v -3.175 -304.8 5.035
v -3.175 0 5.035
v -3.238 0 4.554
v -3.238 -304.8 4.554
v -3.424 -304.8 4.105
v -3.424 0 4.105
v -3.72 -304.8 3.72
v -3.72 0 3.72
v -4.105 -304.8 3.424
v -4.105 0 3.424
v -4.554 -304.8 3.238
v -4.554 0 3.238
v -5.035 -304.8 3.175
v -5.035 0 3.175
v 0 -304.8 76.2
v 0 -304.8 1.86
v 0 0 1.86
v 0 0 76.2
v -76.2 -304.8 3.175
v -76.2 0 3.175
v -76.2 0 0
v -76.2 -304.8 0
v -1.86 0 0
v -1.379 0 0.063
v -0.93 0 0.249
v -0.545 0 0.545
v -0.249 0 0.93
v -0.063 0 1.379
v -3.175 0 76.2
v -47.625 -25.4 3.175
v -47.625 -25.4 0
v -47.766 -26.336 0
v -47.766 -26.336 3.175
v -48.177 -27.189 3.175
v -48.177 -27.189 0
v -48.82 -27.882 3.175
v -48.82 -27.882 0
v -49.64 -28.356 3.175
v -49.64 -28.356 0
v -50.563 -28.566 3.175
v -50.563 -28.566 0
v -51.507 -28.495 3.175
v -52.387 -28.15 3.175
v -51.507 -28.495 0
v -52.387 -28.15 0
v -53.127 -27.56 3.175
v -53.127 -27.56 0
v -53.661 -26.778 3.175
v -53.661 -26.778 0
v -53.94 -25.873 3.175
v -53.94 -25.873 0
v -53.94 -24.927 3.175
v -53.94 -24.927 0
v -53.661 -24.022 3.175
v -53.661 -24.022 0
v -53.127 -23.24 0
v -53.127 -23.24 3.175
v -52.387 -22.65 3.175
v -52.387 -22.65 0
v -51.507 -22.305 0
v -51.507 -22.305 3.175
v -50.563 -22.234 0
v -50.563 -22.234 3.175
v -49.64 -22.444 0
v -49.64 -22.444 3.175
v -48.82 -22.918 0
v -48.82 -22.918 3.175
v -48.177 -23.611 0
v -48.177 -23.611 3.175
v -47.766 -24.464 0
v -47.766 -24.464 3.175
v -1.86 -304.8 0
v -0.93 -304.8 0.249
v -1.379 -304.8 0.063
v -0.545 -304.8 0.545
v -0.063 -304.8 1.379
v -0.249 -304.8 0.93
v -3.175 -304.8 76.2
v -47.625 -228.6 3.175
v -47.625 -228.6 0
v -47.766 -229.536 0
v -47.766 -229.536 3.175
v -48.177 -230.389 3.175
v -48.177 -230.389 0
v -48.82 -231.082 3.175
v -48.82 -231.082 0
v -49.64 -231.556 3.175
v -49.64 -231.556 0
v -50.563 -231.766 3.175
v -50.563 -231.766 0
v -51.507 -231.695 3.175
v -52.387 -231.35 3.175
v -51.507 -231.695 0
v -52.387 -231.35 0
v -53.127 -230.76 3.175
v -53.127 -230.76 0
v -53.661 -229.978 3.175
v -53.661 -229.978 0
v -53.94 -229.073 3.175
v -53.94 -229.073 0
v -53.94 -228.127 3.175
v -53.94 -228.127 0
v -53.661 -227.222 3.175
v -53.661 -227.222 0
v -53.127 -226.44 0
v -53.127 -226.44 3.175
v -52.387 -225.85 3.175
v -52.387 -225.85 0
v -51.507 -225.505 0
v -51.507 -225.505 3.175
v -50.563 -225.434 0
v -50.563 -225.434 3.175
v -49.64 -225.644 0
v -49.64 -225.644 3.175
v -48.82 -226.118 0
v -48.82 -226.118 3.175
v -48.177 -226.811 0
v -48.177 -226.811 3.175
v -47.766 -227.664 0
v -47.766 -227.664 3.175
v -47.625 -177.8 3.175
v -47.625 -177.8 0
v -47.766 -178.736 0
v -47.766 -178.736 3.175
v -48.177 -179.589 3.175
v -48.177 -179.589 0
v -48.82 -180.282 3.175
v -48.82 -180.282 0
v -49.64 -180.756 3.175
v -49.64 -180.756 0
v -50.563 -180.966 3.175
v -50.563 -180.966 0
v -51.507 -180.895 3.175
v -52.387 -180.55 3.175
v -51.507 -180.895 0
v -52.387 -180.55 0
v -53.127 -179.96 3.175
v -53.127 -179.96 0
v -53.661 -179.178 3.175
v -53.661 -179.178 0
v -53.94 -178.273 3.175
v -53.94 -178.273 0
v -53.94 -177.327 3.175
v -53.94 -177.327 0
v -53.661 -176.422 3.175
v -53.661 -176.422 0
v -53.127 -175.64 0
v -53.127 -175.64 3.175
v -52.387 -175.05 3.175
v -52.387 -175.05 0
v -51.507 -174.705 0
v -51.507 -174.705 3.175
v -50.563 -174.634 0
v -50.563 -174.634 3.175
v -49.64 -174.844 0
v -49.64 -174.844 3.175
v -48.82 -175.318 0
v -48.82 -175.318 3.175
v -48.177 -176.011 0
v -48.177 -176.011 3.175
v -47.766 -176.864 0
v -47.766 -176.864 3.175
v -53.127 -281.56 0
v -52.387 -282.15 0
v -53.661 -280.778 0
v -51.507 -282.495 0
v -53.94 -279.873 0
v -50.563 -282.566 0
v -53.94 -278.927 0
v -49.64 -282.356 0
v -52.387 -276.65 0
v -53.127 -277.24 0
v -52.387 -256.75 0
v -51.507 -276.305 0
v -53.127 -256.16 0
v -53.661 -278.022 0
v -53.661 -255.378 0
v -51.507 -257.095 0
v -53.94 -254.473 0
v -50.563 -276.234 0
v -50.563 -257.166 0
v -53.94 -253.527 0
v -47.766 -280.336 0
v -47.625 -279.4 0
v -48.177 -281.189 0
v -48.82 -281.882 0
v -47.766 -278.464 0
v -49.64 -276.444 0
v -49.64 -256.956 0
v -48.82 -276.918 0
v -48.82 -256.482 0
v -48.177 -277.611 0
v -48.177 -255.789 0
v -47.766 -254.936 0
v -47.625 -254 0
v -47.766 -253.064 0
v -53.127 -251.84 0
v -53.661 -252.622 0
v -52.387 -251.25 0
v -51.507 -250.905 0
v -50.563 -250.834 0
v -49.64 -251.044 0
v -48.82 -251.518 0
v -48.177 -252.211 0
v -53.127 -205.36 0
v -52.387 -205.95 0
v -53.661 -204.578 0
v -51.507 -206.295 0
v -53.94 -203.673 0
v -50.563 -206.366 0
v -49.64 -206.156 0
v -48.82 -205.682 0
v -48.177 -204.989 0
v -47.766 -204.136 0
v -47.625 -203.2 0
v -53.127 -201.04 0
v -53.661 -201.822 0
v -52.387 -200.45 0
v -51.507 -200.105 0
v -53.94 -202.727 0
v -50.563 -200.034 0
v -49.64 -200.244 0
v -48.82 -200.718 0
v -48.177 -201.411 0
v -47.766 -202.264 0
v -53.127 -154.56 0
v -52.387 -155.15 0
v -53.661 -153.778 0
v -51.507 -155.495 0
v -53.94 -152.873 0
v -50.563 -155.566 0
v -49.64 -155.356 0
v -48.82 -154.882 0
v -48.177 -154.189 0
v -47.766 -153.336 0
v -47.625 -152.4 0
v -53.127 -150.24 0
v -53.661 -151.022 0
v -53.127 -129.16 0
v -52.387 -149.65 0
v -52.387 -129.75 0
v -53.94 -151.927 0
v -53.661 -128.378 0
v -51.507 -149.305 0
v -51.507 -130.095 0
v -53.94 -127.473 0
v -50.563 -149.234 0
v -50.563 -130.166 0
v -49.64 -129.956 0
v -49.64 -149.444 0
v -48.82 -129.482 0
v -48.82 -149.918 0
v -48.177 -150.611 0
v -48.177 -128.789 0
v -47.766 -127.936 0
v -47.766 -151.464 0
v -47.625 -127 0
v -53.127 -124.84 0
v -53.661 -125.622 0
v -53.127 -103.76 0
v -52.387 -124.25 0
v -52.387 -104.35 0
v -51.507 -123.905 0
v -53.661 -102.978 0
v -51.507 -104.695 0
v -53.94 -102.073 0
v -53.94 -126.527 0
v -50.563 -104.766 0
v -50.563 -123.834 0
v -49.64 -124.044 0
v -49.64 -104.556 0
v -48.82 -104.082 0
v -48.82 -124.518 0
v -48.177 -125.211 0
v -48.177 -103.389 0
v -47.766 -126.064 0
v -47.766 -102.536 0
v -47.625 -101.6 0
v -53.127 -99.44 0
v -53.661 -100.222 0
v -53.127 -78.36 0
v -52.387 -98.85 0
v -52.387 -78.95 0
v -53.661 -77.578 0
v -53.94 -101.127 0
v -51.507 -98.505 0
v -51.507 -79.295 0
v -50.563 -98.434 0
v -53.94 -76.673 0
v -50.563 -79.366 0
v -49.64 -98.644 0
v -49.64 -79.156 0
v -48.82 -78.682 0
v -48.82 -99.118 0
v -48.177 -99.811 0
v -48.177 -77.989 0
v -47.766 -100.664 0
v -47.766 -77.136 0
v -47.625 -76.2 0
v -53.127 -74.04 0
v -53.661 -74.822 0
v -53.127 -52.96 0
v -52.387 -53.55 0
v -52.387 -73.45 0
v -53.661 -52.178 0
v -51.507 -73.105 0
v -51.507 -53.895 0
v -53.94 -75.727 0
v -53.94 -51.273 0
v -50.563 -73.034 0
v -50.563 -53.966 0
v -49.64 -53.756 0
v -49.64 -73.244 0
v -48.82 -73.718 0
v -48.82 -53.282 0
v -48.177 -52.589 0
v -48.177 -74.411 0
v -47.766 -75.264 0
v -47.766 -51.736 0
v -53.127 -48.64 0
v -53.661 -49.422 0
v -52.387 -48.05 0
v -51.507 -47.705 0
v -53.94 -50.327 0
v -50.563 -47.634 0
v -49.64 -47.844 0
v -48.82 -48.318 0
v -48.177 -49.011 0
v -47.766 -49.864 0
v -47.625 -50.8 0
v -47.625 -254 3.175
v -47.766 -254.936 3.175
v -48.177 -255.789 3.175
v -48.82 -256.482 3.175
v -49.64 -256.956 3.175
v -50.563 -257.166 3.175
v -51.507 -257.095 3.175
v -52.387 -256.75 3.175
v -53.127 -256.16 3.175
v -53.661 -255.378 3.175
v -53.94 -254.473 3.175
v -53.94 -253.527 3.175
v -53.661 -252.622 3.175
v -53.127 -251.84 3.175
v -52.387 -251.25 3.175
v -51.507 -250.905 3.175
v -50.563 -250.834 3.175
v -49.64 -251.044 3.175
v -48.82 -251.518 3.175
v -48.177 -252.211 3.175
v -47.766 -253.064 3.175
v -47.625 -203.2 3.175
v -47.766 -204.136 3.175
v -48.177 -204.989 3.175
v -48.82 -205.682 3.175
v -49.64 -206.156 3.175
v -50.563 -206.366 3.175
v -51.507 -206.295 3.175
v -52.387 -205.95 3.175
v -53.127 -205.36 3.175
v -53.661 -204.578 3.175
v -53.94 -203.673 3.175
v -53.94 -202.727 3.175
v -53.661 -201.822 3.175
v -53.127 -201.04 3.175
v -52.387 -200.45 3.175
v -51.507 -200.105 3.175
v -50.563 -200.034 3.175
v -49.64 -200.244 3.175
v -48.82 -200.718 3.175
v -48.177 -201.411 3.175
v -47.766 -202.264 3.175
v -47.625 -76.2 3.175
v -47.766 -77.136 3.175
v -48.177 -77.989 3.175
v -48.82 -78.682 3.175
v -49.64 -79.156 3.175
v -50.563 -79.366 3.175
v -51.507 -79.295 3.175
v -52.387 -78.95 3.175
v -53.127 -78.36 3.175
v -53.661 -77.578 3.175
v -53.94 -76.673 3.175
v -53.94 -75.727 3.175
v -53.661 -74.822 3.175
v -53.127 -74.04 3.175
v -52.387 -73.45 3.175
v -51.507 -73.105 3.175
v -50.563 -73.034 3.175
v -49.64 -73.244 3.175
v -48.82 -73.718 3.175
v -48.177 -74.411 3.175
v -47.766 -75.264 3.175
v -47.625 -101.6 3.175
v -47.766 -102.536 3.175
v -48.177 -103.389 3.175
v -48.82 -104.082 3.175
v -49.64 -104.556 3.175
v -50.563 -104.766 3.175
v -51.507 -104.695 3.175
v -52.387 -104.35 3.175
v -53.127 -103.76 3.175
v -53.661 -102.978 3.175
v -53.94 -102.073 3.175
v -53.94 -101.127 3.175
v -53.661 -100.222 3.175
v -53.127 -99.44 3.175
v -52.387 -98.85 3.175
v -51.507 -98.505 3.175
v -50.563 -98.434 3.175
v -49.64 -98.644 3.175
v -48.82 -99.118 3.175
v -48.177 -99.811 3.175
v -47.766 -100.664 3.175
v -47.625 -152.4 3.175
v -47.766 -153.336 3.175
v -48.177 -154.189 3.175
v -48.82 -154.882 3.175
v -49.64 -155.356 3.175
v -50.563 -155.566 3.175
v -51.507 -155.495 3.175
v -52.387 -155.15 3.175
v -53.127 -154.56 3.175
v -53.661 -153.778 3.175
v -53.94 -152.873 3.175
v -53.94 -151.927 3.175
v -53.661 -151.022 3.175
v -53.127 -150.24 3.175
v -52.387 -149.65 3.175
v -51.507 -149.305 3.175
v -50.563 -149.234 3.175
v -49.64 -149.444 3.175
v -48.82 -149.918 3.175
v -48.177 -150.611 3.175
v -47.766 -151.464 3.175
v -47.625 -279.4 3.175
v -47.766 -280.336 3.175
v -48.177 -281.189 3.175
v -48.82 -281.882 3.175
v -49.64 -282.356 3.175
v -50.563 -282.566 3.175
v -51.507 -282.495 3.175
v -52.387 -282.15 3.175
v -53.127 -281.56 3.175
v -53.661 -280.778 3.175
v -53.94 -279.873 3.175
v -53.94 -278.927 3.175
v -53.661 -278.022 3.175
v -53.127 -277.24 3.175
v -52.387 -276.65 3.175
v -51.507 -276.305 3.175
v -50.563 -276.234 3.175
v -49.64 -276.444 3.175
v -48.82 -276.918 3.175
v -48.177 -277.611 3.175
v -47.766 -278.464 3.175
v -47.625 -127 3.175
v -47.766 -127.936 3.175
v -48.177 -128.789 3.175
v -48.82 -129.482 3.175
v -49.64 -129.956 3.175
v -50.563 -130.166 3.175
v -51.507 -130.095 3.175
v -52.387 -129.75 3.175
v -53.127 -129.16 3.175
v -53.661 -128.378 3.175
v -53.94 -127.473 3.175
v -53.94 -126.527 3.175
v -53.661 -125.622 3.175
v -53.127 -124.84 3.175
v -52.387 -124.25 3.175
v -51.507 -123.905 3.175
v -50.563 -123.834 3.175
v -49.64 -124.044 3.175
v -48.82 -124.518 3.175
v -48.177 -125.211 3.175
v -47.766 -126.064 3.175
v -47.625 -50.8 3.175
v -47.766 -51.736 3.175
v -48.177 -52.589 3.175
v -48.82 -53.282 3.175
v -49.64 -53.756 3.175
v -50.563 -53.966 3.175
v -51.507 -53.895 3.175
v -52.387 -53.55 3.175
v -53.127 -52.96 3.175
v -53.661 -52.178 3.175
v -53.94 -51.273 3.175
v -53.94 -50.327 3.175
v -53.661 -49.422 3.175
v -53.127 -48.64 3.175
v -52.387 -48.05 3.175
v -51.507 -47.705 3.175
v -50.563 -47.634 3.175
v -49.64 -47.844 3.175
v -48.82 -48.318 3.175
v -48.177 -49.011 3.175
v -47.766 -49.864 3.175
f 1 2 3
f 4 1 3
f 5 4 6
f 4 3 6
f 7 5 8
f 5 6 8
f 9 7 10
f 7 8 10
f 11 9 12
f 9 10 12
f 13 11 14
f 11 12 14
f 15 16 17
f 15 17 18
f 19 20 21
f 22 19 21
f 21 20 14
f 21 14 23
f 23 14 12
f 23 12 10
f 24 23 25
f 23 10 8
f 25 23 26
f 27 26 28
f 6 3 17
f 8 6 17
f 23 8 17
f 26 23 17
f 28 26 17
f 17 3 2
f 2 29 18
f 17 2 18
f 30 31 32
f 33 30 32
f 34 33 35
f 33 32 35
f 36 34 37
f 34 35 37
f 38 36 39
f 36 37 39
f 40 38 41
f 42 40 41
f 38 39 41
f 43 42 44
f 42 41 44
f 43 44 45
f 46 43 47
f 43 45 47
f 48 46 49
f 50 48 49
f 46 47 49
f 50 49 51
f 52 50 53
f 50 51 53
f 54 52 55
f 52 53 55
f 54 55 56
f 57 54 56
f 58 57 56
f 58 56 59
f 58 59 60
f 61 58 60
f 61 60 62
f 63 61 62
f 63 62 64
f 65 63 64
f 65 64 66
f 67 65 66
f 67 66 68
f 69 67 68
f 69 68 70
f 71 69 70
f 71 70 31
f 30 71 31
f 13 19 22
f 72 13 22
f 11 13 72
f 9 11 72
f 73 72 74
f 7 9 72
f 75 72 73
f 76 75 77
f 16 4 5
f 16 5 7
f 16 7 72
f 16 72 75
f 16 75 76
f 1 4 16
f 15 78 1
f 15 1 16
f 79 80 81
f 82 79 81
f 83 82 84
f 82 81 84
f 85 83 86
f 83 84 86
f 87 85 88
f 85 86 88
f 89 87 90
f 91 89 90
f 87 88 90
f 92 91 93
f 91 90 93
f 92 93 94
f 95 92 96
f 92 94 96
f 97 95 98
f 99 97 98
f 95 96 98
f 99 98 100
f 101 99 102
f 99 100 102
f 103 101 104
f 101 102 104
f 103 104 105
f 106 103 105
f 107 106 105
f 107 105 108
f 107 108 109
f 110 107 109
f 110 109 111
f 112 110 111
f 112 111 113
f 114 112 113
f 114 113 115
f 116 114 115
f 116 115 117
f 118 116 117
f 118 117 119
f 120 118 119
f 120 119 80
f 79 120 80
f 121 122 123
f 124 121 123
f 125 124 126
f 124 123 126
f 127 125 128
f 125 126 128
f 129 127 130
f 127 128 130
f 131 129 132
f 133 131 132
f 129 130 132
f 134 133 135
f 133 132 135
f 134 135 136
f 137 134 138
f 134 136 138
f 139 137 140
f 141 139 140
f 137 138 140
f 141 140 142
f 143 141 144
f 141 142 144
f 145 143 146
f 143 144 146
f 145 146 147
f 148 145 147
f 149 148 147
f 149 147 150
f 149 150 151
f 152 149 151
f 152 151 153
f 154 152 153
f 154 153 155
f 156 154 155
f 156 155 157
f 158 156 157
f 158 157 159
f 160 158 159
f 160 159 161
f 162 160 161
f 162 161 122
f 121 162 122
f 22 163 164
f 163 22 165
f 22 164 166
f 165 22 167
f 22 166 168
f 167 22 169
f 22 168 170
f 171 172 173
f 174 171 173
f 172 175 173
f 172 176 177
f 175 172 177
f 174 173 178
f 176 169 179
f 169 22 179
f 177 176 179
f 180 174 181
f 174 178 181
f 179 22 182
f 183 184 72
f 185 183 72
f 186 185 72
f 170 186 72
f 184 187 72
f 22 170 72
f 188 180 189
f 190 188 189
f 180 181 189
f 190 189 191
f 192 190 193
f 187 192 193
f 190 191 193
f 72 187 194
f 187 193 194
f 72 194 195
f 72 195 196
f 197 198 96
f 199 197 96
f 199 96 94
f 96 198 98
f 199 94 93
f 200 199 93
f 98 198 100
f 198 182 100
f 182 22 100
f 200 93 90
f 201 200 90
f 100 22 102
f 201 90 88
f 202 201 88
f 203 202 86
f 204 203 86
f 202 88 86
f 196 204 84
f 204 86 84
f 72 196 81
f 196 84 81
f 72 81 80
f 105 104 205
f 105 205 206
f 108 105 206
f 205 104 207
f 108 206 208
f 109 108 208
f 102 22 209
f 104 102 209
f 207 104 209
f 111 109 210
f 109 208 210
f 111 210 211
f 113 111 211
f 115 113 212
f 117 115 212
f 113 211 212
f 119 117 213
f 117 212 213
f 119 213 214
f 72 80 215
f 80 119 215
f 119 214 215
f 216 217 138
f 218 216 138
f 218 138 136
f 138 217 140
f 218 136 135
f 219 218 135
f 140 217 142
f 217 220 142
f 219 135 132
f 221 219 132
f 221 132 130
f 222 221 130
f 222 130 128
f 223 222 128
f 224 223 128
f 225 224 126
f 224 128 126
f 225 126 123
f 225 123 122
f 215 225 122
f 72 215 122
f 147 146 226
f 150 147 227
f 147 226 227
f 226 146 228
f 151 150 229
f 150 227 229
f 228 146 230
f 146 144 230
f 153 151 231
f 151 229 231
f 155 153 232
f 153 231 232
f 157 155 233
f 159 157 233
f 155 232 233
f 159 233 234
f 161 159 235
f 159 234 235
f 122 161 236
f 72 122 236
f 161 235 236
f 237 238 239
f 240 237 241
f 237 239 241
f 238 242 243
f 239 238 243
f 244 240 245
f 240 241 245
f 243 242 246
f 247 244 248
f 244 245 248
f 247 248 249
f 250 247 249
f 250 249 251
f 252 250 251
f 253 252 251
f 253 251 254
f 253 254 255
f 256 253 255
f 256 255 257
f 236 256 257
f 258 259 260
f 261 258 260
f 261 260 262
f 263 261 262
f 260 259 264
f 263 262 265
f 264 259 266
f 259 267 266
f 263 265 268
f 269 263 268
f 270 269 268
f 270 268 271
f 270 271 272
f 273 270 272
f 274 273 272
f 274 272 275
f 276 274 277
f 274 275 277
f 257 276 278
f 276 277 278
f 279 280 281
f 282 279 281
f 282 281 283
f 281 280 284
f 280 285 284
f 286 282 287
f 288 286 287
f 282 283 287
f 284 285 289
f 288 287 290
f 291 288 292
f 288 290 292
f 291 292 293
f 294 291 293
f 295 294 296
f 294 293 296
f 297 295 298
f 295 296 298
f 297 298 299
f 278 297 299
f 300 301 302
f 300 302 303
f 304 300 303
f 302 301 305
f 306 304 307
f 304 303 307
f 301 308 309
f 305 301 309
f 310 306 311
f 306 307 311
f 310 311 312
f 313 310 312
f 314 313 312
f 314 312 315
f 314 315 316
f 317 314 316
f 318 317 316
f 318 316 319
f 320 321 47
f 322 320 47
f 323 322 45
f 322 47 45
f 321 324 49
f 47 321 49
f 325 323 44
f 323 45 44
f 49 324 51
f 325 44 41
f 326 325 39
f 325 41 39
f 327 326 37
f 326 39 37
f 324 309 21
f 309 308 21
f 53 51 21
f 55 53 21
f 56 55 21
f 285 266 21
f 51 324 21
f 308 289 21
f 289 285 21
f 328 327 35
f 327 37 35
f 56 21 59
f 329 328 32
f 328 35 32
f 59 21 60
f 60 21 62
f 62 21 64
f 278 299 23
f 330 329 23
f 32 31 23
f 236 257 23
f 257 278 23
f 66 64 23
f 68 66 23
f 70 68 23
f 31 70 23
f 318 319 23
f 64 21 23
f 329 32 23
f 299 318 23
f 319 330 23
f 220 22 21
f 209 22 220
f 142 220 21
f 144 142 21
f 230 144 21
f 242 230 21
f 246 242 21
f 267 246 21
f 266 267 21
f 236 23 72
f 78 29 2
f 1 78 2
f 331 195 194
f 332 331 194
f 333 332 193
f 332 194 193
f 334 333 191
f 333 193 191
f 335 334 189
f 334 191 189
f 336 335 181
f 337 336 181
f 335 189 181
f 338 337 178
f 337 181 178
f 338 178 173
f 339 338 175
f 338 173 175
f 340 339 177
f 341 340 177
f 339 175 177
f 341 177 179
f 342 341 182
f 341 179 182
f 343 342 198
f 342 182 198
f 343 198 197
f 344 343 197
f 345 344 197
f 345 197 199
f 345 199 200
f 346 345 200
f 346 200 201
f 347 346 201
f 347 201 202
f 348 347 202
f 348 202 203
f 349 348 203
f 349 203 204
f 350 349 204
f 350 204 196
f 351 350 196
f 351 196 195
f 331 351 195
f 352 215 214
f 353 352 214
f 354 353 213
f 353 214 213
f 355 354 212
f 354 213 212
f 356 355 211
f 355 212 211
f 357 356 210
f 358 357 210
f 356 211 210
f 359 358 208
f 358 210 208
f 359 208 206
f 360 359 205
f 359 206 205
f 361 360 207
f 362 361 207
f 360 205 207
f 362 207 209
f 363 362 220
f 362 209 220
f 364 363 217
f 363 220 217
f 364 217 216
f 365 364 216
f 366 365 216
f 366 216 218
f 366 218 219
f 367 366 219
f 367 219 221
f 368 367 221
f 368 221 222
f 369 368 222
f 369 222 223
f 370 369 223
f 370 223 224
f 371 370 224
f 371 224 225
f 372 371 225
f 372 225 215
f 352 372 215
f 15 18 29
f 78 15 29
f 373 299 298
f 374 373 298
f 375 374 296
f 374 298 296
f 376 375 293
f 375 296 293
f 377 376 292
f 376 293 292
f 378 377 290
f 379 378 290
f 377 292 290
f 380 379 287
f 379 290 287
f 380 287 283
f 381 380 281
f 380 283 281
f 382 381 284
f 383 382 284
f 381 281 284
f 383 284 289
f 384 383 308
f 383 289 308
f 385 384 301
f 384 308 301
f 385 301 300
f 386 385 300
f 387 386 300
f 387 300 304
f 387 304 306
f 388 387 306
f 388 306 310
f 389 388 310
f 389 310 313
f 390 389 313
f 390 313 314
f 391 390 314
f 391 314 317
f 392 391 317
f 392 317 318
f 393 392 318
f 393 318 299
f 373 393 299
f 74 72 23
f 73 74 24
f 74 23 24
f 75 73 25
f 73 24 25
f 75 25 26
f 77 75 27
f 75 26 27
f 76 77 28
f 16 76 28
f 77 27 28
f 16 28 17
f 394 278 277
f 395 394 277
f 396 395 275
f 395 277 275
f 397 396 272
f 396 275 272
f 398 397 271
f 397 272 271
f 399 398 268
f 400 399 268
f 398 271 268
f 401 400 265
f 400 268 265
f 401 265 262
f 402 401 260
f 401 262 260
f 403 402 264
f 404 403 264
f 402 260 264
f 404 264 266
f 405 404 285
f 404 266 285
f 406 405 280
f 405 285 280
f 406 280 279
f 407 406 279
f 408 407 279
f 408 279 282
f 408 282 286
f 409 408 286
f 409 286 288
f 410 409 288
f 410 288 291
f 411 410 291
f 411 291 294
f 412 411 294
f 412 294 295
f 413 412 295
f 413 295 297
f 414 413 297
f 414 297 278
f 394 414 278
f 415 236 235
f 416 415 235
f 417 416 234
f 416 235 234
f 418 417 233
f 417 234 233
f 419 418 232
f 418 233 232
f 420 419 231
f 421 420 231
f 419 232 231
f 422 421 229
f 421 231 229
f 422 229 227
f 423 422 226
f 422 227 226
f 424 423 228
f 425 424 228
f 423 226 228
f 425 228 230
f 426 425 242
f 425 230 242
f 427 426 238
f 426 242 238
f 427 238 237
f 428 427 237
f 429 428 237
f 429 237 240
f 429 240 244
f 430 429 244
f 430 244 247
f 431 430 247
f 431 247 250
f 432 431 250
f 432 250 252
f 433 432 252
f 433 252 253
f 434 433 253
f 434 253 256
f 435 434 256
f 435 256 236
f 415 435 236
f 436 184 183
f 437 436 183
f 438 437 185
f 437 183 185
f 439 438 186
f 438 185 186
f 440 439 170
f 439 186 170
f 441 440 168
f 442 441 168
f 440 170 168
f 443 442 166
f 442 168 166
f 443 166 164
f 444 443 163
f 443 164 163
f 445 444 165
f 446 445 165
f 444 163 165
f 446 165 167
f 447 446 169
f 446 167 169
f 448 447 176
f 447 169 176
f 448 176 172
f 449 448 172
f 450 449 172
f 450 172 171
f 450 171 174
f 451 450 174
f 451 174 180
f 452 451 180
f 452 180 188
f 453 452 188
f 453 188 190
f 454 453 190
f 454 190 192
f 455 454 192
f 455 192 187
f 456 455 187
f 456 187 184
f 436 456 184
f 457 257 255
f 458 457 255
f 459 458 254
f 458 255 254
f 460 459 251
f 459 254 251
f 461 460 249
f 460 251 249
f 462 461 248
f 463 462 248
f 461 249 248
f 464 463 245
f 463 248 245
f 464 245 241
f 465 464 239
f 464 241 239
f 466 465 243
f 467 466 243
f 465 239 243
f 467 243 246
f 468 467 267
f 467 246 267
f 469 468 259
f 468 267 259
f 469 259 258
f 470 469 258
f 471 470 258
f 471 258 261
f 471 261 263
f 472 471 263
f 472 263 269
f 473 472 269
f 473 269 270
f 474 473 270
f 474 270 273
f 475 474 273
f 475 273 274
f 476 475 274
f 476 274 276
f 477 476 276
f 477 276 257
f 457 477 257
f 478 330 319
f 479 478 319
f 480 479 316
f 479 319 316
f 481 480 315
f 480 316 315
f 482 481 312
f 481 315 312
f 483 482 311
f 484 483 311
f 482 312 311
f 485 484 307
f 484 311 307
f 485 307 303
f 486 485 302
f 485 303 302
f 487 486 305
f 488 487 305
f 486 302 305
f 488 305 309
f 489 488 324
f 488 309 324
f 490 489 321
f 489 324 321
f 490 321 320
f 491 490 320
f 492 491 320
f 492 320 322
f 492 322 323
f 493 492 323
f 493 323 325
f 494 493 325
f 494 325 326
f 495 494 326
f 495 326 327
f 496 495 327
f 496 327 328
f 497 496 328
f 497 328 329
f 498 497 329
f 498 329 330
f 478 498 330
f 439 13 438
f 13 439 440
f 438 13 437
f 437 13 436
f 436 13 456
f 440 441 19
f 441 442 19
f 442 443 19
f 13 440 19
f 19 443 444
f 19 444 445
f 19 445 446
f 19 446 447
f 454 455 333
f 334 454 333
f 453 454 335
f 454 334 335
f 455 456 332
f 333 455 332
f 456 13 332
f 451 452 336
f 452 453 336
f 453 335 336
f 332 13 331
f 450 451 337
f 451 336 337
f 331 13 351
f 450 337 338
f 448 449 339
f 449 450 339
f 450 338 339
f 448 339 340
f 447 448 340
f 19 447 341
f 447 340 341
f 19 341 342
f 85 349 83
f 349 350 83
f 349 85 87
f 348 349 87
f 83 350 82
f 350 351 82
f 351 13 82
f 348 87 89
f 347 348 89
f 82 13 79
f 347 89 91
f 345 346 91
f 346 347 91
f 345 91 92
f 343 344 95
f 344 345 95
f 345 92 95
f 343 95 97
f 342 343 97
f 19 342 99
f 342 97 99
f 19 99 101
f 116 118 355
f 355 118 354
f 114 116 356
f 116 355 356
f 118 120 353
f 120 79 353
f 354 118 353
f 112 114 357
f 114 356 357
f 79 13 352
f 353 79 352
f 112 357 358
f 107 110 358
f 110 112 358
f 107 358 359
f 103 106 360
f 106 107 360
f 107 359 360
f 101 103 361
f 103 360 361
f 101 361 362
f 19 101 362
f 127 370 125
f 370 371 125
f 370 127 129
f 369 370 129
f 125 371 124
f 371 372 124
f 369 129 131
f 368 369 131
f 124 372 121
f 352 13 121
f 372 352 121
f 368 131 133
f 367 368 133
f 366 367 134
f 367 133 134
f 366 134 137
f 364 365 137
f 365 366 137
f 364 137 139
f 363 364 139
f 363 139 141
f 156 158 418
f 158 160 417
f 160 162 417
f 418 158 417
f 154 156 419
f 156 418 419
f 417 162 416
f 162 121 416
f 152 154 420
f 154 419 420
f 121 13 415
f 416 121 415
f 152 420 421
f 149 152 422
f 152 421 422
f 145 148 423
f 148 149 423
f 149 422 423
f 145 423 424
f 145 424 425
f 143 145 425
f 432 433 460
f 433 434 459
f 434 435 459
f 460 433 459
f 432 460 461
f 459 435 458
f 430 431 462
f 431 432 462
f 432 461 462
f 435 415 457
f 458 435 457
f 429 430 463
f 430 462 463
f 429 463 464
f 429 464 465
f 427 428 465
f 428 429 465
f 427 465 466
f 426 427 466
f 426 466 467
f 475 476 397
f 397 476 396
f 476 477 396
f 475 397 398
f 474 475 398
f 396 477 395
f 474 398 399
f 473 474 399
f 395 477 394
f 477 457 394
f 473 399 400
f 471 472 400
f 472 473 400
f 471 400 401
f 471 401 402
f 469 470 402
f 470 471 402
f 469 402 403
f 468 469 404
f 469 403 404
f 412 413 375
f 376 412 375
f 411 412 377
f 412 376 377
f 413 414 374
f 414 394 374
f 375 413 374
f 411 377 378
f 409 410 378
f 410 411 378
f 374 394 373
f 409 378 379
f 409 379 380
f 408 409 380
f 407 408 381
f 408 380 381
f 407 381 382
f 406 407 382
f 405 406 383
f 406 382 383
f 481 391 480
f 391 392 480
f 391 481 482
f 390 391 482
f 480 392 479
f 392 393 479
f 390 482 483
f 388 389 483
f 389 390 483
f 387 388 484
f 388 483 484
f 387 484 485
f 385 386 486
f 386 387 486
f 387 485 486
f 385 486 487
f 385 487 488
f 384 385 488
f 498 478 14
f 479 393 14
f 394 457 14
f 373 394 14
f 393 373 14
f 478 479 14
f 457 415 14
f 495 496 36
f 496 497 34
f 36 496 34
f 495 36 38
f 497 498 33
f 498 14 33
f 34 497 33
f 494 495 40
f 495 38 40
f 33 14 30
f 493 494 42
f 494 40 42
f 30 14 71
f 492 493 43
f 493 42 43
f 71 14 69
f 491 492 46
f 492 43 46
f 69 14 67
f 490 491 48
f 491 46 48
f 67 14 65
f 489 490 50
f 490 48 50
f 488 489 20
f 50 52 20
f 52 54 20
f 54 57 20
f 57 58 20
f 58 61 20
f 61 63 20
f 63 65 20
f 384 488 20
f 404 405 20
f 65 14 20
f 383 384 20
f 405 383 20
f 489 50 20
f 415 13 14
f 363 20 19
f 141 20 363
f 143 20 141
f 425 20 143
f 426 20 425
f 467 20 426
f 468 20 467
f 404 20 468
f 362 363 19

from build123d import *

# Parameters (mm, degrees)
F1_DEPTH = 304.8
F3_R     = 3.175
F4_DEPTH = 76.201


with BuildPart() as f1:
    # F0 (on Front) → F1 (new body)
    with BuildSketch(Plane.XZ):
        with BuildLine():
            Line((-76.2, 0), (-1.8598719395, 0))
            ThreePointArc((-1.8598719395, 0), (-3.5781695574, 1.1481297619), (-3.175, 3.175))
            Line((-3.175, 3.175), (-5.0348719936, 3.175))
            Line((-5.0348719936, 3.175), (-76.2, 3.175))
            Line((-76.2, 3.175), (-76.2, 0))
        make_face()
        with BuildLine():
            ThreePointArc((-3.175, 3.175), (-1.1481297619, 3.5781695574), (0, 1.8598719395))
            Line((0, 1.8598719395), (0, 76.2))
            Line((0, 76.2), (-3.175, 76.2))
            Line((-3.175, 76.2), (-3.175, 5.0348719395))
            Line((-3.175, 5.0348719395), (-3.175, 3.175))
        make_face()
        with BuildLine():
            Line((-5.0348719936, 3.175), (-3.175, 3.175))
            Line((-3.175, 3.175), (-3.175, 5.0348719395))
            ThreePointArc((-3.175, 5.0348719395), (-3.7197438981, 3.7197438598), (-5.0348719936, 3.175))
        make_face()
        with BuildLine():
            ThreePointArc((-3.175, 3.175), (-3.5781695574, 1.1481297619), (-1.8598719395, 0))
            ThreePointArc((-1.8598719395, 0), (-0.5447438789, 0.5447438789), (0, 1.8598719395))
            ThreePointArc((0, 1.8598719395), (-1.1481297619, 3.5781695574), (-3.175, 3.175))
        make_face()
    extrude(amount=F1_DEPTH)

    # F3 (on face) → F4 (cut, through all)
    with BuildSketch(Plane(origin=(0, 0, 0), x_dir=(1, 0, 0), z_dir=(0, 0, -1))):
        with Locations((-50.8, 279.4)):
            Circle(F3_R)
        with Locations((-50.8, 254)):
            Circle(F3_R)
        with Locations((-50.8, 228.6)):
            Circle(F3_R)
        with Locations((-50.8, 203.2)):
            Circle(F3_R)
        with Locations((-50.8, 177.8)):
            Circle(F3_R)
        with Locations((-50.8, 152.4)):
            Circle(F3_R)
        with Locations((-50.8, 127)):
            Circle(F3_R)
        with Locations((-50.8, 101.6)):
            Circle(F3_R)
        with Locations((-50.8, 76.2)):
            Circle(F3_R)
        with Locations((-50.8, 50.8)):
            Circle(F3_R)
        with Locations((-50.8, 25.4)):
            Circle(F3_R)
    extrude(amount=-F4_DEPTH, mode=Mode.SUBTRACT)


solid = f1.part
